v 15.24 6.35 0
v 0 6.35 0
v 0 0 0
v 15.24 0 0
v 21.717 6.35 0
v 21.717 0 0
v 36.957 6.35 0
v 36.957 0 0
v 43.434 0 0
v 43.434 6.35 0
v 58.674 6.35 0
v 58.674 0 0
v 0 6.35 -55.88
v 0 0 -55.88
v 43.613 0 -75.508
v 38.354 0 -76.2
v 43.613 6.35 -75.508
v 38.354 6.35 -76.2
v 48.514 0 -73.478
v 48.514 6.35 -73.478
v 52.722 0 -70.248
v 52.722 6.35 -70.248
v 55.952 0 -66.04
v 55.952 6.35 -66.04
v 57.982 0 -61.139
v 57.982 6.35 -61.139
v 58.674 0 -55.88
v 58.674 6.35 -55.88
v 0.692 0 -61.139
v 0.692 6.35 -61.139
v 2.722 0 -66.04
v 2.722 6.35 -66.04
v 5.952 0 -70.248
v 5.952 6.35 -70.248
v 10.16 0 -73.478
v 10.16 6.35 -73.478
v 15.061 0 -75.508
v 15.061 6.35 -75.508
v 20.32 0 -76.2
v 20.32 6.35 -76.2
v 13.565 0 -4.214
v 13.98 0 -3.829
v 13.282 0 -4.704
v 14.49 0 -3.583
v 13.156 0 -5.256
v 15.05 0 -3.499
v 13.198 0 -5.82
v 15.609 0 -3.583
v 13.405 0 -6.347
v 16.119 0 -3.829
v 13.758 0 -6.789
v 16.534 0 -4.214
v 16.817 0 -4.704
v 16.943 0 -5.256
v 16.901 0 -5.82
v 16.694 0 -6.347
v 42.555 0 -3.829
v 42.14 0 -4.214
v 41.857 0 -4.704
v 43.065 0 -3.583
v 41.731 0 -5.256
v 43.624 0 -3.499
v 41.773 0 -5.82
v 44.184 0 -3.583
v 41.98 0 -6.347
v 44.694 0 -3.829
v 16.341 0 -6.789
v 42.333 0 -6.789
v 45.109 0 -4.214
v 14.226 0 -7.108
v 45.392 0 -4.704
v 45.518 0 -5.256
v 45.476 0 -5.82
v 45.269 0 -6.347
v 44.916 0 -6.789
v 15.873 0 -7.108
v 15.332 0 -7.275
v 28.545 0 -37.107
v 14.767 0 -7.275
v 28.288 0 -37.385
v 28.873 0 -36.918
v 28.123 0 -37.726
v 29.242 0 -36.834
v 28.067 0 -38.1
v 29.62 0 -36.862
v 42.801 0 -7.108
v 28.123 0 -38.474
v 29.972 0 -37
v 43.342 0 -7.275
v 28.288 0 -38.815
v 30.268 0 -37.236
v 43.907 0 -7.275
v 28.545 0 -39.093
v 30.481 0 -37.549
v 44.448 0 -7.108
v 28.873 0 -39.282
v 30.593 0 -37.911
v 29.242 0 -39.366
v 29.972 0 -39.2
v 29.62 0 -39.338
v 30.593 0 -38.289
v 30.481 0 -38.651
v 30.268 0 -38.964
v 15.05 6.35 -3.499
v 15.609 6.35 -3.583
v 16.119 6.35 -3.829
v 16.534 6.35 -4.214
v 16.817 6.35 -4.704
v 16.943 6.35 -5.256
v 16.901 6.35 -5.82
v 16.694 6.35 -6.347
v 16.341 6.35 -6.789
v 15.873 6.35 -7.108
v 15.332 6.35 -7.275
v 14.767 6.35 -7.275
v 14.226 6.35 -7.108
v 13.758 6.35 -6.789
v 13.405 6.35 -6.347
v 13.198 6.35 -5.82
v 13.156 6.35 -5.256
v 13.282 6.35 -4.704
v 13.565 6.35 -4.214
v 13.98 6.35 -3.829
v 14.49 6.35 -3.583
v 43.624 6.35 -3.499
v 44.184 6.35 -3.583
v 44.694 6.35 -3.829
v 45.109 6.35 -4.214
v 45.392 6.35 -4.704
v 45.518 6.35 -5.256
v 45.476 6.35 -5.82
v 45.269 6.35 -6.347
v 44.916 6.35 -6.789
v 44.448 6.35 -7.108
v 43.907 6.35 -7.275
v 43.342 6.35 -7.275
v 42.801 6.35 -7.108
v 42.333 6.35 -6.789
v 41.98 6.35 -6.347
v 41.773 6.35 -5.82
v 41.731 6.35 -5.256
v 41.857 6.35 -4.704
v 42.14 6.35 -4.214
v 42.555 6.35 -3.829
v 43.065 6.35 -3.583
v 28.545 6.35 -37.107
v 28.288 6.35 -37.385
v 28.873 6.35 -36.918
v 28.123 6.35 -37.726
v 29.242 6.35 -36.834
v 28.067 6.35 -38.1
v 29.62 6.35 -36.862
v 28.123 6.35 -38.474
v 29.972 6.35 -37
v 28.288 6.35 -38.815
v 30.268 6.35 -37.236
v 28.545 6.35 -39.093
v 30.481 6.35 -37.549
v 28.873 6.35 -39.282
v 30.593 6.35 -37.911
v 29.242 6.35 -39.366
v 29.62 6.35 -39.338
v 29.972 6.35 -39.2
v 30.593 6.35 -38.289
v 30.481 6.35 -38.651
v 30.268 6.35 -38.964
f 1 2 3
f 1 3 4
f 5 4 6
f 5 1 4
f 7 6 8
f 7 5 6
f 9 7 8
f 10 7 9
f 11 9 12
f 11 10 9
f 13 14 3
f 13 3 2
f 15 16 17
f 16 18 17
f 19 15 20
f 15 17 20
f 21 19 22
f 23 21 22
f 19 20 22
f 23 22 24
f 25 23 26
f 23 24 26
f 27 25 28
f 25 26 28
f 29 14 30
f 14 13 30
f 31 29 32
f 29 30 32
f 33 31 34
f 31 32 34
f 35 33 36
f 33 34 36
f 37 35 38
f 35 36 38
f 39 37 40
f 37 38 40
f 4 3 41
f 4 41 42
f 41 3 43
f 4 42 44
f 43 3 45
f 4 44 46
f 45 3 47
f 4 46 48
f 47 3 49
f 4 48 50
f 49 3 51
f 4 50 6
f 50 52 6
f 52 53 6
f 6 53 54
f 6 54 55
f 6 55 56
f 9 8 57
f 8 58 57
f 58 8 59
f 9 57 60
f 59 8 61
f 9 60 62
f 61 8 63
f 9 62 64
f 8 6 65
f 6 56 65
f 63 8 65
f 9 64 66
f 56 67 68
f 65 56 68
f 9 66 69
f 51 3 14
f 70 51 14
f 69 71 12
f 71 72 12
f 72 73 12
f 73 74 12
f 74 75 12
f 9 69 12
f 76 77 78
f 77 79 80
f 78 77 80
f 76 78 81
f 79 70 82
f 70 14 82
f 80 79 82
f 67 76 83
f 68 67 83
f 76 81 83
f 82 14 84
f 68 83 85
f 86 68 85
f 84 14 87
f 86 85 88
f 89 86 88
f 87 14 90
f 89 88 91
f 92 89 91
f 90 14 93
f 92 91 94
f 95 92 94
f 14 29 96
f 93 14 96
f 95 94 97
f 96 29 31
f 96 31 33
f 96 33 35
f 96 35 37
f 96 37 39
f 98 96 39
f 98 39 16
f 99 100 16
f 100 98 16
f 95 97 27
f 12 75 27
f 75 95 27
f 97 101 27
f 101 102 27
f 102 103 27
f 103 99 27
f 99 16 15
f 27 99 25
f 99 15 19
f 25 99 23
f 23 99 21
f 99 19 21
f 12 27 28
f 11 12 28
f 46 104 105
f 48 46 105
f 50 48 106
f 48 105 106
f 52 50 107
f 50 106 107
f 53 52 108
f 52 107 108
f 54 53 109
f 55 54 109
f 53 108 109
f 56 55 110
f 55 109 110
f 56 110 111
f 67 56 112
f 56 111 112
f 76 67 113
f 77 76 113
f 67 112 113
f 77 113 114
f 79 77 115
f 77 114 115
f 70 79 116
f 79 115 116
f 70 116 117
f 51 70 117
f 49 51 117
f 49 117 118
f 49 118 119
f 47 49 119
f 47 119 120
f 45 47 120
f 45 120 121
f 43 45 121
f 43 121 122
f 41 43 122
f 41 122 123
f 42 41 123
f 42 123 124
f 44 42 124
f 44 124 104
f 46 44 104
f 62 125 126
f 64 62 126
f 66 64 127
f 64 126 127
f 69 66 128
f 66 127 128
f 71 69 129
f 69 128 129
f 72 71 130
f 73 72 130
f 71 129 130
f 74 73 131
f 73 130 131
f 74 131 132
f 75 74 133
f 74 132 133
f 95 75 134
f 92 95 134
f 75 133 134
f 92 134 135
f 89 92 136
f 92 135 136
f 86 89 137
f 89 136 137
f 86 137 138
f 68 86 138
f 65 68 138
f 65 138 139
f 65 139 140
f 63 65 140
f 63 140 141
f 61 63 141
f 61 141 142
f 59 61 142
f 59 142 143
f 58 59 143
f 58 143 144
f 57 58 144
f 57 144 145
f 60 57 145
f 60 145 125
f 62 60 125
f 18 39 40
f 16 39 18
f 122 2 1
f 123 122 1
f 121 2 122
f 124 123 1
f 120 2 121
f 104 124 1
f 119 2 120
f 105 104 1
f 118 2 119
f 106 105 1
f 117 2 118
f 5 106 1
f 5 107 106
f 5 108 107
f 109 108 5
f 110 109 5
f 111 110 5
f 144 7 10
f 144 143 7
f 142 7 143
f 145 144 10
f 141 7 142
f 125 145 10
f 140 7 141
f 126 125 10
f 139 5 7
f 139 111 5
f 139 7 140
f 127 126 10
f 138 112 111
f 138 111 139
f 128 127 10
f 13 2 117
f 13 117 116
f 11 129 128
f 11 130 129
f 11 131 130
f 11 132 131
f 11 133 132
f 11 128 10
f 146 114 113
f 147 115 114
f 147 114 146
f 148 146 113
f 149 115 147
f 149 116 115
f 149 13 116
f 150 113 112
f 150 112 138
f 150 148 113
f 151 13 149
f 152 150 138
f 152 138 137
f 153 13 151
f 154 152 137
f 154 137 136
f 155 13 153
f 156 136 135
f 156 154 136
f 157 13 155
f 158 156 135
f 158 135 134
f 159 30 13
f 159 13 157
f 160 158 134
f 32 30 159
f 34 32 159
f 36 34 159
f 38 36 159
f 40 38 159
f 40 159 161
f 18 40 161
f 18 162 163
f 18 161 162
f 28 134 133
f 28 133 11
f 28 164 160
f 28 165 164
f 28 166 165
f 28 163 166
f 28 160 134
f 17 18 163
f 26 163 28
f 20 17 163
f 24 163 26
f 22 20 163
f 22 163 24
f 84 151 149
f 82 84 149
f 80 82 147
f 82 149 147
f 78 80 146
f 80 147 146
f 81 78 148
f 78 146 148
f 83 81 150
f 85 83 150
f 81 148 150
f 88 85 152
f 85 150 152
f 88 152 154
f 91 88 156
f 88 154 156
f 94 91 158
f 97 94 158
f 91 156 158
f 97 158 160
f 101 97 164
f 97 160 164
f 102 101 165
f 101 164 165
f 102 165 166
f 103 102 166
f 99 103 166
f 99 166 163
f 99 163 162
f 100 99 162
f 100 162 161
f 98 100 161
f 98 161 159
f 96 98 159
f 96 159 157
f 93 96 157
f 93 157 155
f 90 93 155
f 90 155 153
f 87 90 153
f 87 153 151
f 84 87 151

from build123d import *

# Parameters (mm, degrees)
SKETCH1_W           = 58.674
SKETCH1_H           = 76.2
BOSS_EXTRUDE1_DEPTH = 6.35
CUT_EXTRUDE1_DEPTH  = 97.381537527
SKETCH3_W           = 58.674
SKETCH3_H           = 6.35
BOSS_EXTRUDE2_DEPTH = 7.62
SKETCH4_W           = 15.24
SKETCH4_H           = 7.62
CUT_EXTRUDE2_DEPTH  = 97.381537527
FILLET1_R           = 3.175
SKETCH5_R           = 2.54
CUT_EXTRUDE3_DEPTH  = 88.939040568
FILLET2_R           = 20.32
SKETCH7_W           = 58.92775625
SKETCH7_H           = 8.241690561
CUT_EXTRUDE4_DEPTH  = 97.381537527
SKETCH8_R           = 1.89865
CUT_EXTRUDE5_DEPTH  = 97.381537527


with BuildPart() as part:
    # Sketch1 → Boss-Extrude1 (new body)
    with BuildSketch(Plane(origin=(0, 0, 0), x_dir=(1, 0, 0), z_dir=(0, 1, 0))):
        with Locations((29.337, 38.1)):
            Rectangle(SKETCH1_W, SKETCH1_H)
    extrude(amount=BOSS_EXTRUDE1_DEPTH)

    # Sketch2 → Cut-Extrude1 (cut, through all)
    with BuildSketch(Plane(origin=(0, 6.35, 0), x_dir=(1, 0, 0), z_dir=(0, 1, 0))):
        with BuildLine():
            ThreePointArc((30.607, 38.1), (29.337, 39.37), (28.067, 38.1))
            Line((28.067, 38.1), (30.607, 38.1))
        make_face()
        with BuildLine():
            Line((30.607, 38.1), (28.067, 38.1))
            ThreePointArc((28.067, 38.1), (29.337, 36.83), (30.607, 38.1))
        make_face()
    extrude(amount=-CUT_EXTRUDE1_DEPTH, mode=Mode.SUBTRACT)

    # Sketch3 → Boss-Extrude2 (add)
    with BuildSketch(Plane.XY):
        with Locations((29.337, 3.175)):
            Rectangle(SKETCH3_W, SKETCH3_H)
    extrude(amount=BOSS_EXTRUDE2_DEPTH)

    # Sketch4 → Cut-Extrude2 (cut, through all)
    with BuildSketch(Plane(origin=(0, 6.35, 0), x_dir=(1, 0, 0), z_dir=(0, 1, 0))):
        with Locations((7.62, -3.81)):
            Rectangle(SKETCH4_W, SKETCH4_H)
        with Locations((29.337, -3.81)):
            Rectangle(SKETCH4_W, SKETCH4_H)
        with Locations((51.054, -3.81)):
            Rectangle(SKETCH4_W, SKETCH4_H)
    extrude(amount=-CUT_EXTRUDE2_DEPTH, mode=Mode.SUBTRACT)

    # Fillet1
    fillet1_edges = [part.edges().sort_by_distance(p)[0] for p in [
        (40.1955, 0, 7.62),
        (40.1955, 6.35, 7.62),
        (18.4785, 0, 7.62),
        (18.4785, 6.35, 7.62),
    ]]
    fillet(fillet1_edges, radius=FILLET1_R - 0.0001)  # a hair under: the kernel refuses the full size

    # Sketch5 → Cut-Extrude3 (cut, through all)
    with BuildSketch(Plane(origin=(43.434, 0, 0), x_dir=(0, 0, -1), z_dir=(1, 0, 0))):
        with Locations((-4.445, 3.175)):
            Circle(SKETCH5_R)
    extrude(amount=-CUT_EXTRUDE3_DEPTH, mode=Mode.SUBTRACT)

    # Fillet2
    fillet2_edges = [part.edges().sort_by_distance(p)[0] for p in [
        (0, 3.175, -76.2),
        (58.674, 3.175, -76.2),
    ]]
    fillet(fillet2_edges, radius=FILLET2_R)

    # Sketch7 → Cut-Extrude4 (cut, through all)
    with BuildSketch(Plane(origin=(0, 6.35, 0), x_dir=(1, 0, 0), z_dir=(0, 1, 0))):
        with Locations((29.463878125, -4.120845281)):
            Rectangle(SKETCH7_W, SKETCH7_H)
    extrude(amount=-CUT_EXTRUDE4_DEPTH, mode=Mode.SUBTRACT)

    # Sketch8 → Cut-Extrude5 (cut, through all)
    with BuildSketch(Plane(origin=(0, 6.35, 0), x_dir=(1, 0, 0), z_dir=(0, 1, 0))):
        with Locations(Location((43.6245, 5.3975, 0), (0, 0, 270))):
            Circle(SKETCH8_R)
        with Locations(Location((15.0495, 5.3975, 0), (0, 0, 270))):
            Circle(SKETCH8_R)
    extrude(amount=-CUT_EXTRUDE5_DEPTH, mode=Mode.SUBTRACT)


solid = part.part
